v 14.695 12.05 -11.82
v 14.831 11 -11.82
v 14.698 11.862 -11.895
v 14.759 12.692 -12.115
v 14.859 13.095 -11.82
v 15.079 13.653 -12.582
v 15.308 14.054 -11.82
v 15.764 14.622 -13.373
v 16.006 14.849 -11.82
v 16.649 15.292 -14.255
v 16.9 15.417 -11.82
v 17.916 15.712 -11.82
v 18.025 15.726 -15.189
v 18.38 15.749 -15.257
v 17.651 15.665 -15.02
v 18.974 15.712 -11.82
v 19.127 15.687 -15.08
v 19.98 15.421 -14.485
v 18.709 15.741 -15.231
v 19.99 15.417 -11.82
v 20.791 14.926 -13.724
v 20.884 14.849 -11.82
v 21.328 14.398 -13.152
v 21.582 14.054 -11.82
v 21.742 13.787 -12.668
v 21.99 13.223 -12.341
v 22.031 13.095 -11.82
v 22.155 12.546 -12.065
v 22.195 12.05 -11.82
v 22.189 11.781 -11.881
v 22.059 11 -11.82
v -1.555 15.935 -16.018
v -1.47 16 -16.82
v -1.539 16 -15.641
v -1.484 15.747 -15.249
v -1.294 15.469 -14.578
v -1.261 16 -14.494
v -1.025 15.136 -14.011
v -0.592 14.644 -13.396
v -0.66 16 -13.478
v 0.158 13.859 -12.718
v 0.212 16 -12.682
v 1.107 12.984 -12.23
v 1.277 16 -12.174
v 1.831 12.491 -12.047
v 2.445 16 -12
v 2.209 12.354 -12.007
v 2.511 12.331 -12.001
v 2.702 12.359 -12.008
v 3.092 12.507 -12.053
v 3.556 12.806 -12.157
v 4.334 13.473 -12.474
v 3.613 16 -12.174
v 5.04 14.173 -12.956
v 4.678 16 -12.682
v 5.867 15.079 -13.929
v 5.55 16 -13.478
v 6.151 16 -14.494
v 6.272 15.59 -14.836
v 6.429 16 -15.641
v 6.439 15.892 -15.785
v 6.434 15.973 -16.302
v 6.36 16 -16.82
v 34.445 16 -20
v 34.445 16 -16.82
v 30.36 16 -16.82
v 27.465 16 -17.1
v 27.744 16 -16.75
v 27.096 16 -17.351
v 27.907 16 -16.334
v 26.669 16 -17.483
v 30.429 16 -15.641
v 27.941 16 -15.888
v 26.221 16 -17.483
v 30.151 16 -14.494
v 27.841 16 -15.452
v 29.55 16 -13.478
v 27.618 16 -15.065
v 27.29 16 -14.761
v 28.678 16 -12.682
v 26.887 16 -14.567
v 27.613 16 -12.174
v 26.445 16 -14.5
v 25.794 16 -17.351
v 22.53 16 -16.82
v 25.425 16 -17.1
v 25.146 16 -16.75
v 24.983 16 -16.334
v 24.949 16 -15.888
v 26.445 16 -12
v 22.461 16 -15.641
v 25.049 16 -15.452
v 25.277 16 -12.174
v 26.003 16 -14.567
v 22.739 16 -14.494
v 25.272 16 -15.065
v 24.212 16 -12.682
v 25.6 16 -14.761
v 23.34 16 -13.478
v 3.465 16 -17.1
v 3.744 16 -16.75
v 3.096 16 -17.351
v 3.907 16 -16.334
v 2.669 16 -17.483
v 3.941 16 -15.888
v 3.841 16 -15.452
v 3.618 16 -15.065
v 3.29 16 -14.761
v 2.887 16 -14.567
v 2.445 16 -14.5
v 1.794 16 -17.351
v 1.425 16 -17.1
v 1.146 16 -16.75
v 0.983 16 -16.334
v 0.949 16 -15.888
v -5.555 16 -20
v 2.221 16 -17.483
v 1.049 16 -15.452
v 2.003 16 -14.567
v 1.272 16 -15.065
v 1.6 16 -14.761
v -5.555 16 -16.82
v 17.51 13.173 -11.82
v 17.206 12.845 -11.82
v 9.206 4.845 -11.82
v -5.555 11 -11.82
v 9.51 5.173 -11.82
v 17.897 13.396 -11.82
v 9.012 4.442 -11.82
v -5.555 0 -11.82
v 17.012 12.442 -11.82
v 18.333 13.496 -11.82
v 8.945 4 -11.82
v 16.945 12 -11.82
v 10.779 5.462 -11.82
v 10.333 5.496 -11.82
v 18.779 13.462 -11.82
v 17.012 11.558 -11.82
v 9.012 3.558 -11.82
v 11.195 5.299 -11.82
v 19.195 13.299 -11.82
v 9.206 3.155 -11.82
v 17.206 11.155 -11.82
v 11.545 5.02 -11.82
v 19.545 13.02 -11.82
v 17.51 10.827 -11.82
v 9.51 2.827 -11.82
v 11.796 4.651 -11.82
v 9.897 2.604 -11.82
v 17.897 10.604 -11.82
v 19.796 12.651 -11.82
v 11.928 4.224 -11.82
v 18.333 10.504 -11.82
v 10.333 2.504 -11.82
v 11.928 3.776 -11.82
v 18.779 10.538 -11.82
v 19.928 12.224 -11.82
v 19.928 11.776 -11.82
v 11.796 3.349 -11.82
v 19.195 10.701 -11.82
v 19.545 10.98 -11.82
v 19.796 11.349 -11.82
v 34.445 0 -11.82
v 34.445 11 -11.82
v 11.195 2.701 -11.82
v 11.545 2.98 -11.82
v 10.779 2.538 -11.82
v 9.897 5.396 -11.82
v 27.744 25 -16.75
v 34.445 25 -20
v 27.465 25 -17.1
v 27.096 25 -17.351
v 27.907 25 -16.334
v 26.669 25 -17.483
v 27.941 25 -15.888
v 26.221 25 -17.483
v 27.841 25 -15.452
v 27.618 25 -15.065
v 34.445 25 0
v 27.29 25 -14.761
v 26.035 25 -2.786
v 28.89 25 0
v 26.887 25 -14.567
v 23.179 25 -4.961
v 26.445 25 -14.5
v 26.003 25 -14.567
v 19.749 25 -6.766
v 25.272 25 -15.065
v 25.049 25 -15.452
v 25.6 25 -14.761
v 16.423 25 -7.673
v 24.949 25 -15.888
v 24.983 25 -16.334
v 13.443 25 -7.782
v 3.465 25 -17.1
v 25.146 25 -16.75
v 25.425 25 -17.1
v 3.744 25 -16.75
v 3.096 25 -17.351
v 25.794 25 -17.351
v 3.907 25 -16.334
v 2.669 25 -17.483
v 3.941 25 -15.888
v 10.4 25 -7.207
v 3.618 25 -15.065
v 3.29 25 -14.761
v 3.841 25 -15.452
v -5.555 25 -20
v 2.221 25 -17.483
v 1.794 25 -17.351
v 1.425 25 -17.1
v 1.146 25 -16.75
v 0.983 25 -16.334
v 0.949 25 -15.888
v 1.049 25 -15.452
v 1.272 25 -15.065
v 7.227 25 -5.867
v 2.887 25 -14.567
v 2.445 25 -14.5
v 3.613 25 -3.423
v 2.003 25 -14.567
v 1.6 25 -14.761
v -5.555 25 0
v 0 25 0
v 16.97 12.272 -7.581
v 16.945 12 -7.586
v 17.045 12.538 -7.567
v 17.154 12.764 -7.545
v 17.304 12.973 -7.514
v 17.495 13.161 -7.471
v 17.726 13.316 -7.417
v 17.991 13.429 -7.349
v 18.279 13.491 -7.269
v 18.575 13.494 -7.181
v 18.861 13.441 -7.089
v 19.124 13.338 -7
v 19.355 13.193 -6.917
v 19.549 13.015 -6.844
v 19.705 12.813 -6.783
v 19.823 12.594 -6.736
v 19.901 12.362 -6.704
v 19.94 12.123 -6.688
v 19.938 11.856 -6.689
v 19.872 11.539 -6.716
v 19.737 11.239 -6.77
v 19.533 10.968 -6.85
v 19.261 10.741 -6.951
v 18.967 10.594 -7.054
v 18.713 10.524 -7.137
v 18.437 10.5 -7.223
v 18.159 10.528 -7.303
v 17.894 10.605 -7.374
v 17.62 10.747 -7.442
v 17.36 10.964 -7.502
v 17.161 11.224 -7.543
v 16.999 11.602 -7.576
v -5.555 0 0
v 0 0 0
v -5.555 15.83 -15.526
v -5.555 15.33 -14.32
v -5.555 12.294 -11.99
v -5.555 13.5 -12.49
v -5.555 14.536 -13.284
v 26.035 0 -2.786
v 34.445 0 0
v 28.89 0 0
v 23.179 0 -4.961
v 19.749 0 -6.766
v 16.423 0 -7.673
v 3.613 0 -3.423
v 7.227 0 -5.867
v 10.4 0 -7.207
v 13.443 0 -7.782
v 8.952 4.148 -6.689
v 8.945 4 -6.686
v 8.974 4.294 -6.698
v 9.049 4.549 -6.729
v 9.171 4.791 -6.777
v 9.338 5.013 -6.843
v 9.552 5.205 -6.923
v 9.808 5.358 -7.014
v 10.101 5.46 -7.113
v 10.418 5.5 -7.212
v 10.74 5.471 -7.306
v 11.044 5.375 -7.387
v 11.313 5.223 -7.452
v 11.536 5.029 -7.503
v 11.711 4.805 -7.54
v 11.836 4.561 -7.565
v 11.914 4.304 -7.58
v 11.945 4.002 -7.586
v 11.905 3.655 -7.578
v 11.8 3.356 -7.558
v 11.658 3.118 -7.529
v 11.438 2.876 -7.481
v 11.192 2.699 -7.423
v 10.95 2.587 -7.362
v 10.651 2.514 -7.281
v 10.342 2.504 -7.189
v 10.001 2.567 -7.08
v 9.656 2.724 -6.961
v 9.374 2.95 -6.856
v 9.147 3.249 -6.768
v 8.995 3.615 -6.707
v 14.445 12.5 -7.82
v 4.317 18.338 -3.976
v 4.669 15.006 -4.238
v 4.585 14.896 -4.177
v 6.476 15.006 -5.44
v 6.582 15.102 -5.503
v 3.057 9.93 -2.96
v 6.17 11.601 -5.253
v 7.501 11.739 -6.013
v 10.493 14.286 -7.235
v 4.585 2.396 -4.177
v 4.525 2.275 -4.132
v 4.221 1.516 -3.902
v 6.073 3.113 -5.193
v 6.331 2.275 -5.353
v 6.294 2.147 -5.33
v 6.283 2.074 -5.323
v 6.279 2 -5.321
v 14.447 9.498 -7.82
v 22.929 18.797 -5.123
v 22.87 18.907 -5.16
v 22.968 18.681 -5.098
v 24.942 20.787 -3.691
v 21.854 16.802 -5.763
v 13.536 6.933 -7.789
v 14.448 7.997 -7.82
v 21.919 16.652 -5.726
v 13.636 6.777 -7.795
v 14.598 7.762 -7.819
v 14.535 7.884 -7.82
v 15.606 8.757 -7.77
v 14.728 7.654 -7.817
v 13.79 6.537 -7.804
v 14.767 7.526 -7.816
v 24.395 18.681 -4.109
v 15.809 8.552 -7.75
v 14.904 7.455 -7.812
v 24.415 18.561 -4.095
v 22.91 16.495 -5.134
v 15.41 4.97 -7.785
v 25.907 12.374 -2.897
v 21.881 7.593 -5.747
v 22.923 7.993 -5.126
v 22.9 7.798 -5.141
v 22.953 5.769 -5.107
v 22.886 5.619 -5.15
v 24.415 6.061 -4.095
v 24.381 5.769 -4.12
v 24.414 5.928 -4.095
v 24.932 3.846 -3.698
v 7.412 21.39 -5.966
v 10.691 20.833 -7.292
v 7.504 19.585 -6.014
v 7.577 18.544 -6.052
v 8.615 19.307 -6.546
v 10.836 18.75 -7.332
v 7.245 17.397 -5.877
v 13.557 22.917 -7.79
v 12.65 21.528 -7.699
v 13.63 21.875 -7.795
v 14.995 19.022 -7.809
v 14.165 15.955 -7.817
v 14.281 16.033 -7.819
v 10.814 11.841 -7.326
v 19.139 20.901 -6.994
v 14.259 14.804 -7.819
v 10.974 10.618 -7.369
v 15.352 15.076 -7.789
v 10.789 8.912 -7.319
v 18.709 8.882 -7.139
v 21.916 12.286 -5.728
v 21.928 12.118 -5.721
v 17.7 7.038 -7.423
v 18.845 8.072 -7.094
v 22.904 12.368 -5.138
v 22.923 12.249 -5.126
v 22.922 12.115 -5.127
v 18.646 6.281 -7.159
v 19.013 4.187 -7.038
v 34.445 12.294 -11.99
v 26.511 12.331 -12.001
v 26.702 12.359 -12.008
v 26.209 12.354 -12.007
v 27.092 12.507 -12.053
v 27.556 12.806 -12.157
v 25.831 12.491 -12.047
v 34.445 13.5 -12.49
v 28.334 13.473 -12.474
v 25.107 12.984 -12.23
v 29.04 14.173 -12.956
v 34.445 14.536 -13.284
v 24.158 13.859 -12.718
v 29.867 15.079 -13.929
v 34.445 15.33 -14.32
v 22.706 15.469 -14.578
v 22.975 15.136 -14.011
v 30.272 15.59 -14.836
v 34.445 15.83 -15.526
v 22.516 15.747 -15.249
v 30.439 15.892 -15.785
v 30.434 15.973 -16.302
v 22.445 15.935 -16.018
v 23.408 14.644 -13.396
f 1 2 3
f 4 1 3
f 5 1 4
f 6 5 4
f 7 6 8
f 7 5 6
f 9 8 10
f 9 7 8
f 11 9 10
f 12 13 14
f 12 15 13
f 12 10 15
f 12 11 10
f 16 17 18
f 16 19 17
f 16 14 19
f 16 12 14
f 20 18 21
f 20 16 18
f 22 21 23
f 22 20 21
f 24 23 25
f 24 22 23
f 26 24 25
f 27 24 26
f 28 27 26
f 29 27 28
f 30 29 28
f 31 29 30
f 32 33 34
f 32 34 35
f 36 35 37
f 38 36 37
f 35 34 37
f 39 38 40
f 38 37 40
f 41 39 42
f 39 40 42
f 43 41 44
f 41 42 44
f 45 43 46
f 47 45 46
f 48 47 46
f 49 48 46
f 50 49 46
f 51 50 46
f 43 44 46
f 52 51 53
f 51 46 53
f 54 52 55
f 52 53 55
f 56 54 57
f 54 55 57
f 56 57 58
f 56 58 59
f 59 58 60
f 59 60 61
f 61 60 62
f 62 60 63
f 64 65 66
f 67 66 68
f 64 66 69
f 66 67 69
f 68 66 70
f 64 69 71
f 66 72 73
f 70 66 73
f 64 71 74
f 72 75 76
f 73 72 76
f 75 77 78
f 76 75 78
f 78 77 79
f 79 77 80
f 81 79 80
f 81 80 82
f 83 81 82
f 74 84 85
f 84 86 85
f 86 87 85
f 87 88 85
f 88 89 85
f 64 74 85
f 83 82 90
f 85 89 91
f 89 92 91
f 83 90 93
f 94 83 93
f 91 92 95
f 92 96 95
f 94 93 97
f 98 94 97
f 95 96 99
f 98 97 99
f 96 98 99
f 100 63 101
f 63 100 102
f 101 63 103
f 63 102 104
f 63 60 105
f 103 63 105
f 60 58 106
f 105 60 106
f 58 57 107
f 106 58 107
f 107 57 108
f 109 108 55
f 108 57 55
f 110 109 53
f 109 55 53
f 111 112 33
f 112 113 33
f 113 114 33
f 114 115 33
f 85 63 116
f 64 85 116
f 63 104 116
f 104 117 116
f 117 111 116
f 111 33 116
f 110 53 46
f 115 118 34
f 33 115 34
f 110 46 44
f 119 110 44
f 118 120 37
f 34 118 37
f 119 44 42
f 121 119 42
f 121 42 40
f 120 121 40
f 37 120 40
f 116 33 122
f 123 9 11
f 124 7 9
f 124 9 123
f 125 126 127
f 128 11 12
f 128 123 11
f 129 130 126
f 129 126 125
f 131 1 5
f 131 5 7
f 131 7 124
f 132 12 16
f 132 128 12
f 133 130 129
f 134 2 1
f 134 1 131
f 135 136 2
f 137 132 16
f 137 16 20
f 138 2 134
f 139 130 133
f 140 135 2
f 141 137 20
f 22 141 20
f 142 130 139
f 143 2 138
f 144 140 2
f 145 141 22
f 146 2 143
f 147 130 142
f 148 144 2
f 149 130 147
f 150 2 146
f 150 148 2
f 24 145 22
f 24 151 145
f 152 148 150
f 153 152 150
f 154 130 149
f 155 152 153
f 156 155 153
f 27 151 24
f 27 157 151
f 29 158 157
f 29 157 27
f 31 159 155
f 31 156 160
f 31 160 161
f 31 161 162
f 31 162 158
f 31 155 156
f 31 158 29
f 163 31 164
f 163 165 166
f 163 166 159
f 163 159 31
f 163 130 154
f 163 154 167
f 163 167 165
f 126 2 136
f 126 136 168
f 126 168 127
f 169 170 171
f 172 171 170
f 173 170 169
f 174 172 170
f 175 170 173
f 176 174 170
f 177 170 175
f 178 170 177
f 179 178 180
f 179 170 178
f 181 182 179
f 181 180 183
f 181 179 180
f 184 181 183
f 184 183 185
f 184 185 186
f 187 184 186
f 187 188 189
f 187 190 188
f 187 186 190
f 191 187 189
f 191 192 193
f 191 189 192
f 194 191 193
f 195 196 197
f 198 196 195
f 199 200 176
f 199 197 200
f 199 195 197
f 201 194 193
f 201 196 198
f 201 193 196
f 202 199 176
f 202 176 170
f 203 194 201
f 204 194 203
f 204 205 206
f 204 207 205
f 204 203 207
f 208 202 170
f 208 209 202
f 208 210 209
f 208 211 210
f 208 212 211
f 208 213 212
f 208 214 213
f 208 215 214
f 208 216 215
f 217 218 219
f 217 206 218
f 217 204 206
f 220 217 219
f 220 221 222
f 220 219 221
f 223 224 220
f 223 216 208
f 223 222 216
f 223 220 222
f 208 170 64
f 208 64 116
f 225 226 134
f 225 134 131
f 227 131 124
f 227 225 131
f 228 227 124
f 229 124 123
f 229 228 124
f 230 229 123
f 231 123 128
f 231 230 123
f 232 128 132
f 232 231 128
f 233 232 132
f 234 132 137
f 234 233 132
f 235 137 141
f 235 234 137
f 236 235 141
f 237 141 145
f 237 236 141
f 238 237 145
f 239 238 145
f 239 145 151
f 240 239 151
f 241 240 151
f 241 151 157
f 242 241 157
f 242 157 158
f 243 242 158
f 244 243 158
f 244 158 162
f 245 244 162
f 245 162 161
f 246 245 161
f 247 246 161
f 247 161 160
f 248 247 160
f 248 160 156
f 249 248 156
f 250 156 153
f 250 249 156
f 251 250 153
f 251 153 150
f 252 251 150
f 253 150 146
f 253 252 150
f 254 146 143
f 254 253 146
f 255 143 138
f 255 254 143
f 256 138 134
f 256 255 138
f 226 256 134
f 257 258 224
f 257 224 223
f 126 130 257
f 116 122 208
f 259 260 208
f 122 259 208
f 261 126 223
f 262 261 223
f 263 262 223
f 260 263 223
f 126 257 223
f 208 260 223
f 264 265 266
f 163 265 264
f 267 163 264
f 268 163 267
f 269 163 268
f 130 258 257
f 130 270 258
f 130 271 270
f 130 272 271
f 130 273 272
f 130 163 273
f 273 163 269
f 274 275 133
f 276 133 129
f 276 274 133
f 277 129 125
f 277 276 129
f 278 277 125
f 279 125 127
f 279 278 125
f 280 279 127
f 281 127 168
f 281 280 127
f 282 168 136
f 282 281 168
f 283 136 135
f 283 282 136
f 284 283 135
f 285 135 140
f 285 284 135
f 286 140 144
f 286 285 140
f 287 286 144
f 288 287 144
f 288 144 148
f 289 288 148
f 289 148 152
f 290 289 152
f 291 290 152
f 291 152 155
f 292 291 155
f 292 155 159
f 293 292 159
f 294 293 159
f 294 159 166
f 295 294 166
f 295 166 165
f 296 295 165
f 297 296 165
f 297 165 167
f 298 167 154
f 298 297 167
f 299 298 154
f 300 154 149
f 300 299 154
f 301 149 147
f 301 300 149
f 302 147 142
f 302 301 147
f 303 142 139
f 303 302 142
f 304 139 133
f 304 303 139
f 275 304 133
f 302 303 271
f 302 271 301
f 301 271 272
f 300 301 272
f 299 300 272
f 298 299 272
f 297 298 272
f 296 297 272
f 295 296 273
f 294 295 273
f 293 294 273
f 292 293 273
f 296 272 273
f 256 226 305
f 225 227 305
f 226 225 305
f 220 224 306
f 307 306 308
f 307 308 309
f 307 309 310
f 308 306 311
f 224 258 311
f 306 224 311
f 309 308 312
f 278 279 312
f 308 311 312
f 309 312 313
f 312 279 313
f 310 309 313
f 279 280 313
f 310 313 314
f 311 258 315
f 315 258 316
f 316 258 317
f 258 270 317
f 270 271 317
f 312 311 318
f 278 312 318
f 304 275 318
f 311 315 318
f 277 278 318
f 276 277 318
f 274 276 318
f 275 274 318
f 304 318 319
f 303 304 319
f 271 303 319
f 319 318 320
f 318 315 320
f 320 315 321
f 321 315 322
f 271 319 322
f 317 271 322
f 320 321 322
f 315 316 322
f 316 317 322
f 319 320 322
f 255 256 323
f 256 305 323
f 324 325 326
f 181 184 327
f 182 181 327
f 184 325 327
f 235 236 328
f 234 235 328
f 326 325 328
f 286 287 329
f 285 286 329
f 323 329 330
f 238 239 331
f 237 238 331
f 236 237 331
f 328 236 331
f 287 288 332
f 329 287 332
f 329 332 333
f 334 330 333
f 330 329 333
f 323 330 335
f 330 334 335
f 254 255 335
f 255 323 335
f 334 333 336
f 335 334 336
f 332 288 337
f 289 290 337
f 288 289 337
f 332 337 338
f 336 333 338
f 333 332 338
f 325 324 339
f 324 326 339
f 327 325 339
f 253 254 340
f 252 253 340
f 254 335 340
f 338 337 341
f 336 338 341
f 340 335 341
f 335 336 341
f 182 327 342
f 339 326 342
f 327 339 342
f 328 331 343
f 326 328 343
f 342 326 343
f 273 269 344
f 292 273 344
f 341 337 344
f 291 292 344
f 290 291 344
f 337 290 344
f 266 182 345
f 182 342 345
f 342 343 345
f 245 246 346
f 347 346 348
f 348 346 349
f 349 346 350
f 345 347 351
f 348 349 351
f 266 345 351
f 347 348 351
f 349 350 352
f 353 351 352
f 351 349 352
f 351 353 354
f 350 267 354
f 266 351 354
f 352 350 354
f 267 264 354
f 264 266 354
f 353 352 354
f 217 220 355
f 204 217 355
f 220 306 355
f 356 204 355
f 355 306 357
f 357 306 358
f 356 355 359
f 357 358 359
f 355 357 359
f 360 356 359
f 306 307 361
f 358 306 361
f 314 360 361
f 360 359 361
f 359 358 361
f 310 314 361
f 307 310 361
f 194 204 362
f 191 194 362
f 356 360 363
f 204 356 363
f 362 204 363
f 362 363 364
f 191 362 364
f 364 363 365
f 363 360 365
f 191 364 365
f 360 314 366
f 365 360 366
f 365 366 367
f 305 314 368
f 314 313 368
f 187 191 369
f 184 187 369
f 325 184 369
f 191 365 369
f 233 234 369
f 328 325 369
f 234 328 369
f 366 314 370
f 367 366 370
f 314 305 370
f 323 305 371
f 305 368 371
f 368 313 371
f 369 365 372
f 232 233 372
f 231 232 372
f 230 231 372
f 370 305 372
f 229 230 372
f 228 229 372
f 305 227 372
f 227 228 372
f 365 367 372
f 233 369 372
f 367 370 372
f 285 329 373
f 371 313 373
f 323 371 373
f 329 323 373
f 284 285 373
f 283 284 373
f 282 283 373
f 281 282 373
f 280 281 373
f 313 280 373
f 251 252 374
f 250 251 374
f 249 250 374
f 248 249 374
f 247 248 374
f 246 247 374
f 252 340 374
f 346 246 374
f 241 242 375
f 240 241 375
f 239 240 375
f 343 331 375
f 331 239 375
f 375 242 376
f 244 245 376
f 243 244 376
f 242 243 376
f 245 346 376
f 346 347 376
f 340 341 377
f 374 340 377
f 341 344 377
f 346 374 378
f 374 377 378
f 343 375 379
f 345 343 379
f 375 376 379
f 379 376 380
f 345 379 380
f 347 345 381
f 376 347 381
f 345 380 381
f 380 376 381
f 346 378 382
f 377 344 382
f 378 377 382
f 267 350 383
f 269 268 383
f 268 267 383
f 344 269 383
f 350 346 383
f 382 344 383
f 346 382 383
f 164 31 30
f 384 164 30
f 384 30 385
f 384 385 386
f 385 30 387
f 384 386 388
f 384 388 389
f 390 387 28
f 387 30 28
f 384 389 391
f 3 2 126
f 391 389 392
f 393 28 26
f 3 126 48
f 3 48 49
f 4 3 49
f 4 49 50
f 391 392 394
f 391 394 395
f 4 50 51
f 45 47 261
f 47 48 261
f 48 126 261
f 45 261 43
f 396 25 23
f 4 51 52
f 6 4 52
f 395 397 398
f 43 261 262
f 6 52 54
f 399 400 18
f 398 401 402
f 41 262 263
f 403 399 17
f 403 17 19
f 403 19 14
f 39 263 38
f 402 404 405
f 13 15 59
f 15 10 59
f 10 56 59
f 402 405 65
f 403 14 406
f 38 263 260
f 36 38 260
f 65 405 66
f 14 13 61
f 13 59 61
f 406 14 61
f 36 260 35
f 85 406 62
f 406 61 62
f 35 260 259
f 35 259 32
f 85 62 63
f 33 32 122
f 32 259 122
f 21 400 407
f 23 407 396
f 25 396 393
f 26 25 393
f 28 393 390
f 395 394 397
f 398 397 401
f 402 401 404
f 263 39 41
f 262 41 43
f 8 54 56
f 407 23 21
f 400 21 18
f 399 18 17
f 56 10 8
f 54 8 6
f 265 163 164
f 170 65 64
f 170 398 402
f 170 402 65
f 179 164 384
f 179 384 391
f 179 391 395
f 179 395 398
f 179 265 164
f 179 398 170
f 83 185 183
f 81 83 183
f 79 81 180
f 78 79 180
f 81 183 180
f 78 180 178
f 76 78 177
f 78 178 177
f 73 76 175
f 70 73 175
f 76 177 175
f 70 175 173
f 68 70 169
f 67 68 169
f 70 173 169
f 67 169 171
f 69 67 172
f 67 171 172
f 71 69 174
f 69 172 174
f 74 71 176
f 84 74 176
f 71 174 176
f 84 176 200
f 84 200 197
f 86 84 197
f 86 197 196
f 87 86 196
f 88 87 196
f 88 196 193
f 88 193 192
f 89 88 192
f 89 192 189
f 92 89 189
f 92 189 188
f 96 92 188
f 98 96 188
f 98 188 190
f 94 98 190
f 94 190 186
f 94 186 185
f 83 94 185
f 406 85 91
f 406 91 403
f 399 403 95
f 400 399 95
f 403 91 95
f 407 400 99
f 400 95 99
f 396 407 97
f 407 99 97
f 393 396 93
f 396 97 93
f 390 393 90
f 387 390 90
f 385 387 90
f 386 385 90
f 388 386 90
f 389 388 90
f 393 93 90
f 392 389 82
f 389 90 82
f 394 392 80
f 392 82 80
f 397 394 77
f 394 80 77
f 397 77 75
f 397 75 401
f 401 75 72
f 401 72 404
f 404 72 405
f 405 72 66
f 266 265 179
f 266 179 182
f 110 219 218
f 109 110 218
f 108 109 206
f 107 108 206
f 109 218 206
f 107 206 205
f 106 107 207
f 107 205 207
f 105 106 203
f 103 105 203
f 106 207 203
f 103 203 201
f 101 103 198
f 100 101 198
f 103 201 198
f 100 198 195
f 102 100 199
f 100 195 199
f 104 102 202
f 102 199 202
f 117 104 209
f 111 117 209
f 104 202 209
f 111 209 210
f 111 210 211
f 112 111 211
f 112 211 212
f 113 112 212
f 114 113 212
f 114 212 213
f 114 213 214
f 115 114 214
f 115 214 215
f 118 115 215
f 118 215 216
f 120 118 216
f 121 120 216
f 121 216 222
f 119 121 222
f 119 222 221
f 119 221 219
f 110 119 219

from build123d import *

# Parameters (mm, degrees)
BOSS_EXTRUDE1_DEPTH     = 25
SKETCH2_W               = 40
SKETCH2_H               = 9
BOSS_EXTRUDE2_DEPTH     = 8.18
FILLET1_R               = 5
CUT_EXTRUDE1_DEPTH      = 45.172054958
CUT_EXTRUDE1_DEPTH_BACK = 45.172054958
SKETCH3_R               = 1.5
SKETCH3_3_R             = 3.75
CUT_EXTRUDE2_DEPTH      = 45.172054958
SKETCH4_R               = 1.5
CUT_EXTRUDE3_DEPTH      = 48.026142101
CUT_EXTRUDE9_START      = -9
SKETCH4_4_R             = 4
CUT_EXTRUDE9_DEPTH      = 39.026142101


with BuildPart() as part:
    # Sketch1 → Boss-Extrude1 (new body)
    with BuildSketch(Plane(origin=(0, 0, 0), x_dir=(1, 0, 0), z_dir=(0, 1, 0))):
        with BuildLine():
            Line((0, 0), (-5.555, 0))
            Line((-5.555, 0), (-5.555, 11.82))
            Line((-5.555, 11.82), (15.89, 11.82))
            Line((15.89, 11.82), (34.445, 11.82))
            Line((34.445, 11.82), (34.445, 0))
            Line((34.445, 0), (28.89, 0))
            add(Edge.make_bspline(
                [(0, 0), (14.445, 15.64), (28.89, 0)],
                knots=[0, 0, 0, 1, 1, 1], degree=2))
        make_face()
    extrude(amount=BOSS_EXTRUDE1_DEPTH)

    # Sketch2 → Boss-Extrude2 (add)
    with BuildSketch(Plane(origin=(0, 0, -11.82), x_dir=(-1, 0, 0), z_dir=(0, 0, -1))):
        with Locations((-14.445, 20.5)):
            Rectangle(SKETCH2_W, SKETCH2_H)
    extrude(amount=BOSS_EXTRUDE2_DEPTH)

    # Fillet1
    fillet1_edges = [part.edges().sort_by_distance(p)[0] for p in [
        (14.445, 16, -11.82),
    ]]
    fillet(fillet1_edges, radius=FILLET1_R)

    # Sketch3 → Cut-Extrude1 (cut, two sides: drawn at the far end of the back side and taken through both)
    with BuildSketch(Plane(origin=(0, 0, -11.82), x_dir=(-1, 0, 0), z_dir=(0, 0, -1)).offset(-CUT_EXTRUDE1_DEPTH_BACK)):
        with Locations((-10.445, 4)):
            Circle(SKETCH3_R)
        with Locations((-18.445, 12)):
            Circle(SKETCH3_R)
    extrude(amount=CUT_EXTRUDE1_DEPTH + CUT_EXTRUDE1_DEPTH_BACK, mode=Mode.SUBTRACT)

    # Sketch3<3> → Cut-Extrude2 (cut, through all)
    with BuildSketch(Plane(origin=(0, 0, -11.82), x_dir=(-1, 0, 0), z_dir=(0, 0, -1))):
        with Locations((-18.445, 12)):
            Circle(SKETCH3_3_R)
    extrude(amount=CUT_EXTRUDE2_DEPTH, mode=Mode.SUBTRACT)

    # Sketch4 → Cut-Extrude3 (cut, through all)
    with BuildSketch(Plane(origin=(0, 25, 0), x_dir=(1, 0, 0), z_dir=(0, 1, 0))):
        with Locations(Location((26.445, 16, 0), (0, 0, 270))):
            Circle(SKETCH4_R)
        with Locations(Location((2.445, 16, 0), (0, 0, 270))):
            Circle(SKETCH4_R)
    extrude(amount=-CUT_EXTRUDE3_DEPTH, mode=Mode.SUBTRACT)

    # Sketch4<4> → Cut-Extrude9 (cut, through all)
    with BuildSketch(Plane(origin=(0, 25, 0), x_dir=(1, 0, 0), z_dir=(0, 1, 0)).offset(CUT_EXTRUDE9_START)):
        with Locations((26.445, 16)):
            Circle(SKETCH4_4_R)
        with Locations((2.445, 16)):
            Circle(SKETCH4_4_R)
    extrude(amount=-CUT_EXTRUDE9_DEPTH, mode=Mode.SUBTRACT)


solid = part.part
